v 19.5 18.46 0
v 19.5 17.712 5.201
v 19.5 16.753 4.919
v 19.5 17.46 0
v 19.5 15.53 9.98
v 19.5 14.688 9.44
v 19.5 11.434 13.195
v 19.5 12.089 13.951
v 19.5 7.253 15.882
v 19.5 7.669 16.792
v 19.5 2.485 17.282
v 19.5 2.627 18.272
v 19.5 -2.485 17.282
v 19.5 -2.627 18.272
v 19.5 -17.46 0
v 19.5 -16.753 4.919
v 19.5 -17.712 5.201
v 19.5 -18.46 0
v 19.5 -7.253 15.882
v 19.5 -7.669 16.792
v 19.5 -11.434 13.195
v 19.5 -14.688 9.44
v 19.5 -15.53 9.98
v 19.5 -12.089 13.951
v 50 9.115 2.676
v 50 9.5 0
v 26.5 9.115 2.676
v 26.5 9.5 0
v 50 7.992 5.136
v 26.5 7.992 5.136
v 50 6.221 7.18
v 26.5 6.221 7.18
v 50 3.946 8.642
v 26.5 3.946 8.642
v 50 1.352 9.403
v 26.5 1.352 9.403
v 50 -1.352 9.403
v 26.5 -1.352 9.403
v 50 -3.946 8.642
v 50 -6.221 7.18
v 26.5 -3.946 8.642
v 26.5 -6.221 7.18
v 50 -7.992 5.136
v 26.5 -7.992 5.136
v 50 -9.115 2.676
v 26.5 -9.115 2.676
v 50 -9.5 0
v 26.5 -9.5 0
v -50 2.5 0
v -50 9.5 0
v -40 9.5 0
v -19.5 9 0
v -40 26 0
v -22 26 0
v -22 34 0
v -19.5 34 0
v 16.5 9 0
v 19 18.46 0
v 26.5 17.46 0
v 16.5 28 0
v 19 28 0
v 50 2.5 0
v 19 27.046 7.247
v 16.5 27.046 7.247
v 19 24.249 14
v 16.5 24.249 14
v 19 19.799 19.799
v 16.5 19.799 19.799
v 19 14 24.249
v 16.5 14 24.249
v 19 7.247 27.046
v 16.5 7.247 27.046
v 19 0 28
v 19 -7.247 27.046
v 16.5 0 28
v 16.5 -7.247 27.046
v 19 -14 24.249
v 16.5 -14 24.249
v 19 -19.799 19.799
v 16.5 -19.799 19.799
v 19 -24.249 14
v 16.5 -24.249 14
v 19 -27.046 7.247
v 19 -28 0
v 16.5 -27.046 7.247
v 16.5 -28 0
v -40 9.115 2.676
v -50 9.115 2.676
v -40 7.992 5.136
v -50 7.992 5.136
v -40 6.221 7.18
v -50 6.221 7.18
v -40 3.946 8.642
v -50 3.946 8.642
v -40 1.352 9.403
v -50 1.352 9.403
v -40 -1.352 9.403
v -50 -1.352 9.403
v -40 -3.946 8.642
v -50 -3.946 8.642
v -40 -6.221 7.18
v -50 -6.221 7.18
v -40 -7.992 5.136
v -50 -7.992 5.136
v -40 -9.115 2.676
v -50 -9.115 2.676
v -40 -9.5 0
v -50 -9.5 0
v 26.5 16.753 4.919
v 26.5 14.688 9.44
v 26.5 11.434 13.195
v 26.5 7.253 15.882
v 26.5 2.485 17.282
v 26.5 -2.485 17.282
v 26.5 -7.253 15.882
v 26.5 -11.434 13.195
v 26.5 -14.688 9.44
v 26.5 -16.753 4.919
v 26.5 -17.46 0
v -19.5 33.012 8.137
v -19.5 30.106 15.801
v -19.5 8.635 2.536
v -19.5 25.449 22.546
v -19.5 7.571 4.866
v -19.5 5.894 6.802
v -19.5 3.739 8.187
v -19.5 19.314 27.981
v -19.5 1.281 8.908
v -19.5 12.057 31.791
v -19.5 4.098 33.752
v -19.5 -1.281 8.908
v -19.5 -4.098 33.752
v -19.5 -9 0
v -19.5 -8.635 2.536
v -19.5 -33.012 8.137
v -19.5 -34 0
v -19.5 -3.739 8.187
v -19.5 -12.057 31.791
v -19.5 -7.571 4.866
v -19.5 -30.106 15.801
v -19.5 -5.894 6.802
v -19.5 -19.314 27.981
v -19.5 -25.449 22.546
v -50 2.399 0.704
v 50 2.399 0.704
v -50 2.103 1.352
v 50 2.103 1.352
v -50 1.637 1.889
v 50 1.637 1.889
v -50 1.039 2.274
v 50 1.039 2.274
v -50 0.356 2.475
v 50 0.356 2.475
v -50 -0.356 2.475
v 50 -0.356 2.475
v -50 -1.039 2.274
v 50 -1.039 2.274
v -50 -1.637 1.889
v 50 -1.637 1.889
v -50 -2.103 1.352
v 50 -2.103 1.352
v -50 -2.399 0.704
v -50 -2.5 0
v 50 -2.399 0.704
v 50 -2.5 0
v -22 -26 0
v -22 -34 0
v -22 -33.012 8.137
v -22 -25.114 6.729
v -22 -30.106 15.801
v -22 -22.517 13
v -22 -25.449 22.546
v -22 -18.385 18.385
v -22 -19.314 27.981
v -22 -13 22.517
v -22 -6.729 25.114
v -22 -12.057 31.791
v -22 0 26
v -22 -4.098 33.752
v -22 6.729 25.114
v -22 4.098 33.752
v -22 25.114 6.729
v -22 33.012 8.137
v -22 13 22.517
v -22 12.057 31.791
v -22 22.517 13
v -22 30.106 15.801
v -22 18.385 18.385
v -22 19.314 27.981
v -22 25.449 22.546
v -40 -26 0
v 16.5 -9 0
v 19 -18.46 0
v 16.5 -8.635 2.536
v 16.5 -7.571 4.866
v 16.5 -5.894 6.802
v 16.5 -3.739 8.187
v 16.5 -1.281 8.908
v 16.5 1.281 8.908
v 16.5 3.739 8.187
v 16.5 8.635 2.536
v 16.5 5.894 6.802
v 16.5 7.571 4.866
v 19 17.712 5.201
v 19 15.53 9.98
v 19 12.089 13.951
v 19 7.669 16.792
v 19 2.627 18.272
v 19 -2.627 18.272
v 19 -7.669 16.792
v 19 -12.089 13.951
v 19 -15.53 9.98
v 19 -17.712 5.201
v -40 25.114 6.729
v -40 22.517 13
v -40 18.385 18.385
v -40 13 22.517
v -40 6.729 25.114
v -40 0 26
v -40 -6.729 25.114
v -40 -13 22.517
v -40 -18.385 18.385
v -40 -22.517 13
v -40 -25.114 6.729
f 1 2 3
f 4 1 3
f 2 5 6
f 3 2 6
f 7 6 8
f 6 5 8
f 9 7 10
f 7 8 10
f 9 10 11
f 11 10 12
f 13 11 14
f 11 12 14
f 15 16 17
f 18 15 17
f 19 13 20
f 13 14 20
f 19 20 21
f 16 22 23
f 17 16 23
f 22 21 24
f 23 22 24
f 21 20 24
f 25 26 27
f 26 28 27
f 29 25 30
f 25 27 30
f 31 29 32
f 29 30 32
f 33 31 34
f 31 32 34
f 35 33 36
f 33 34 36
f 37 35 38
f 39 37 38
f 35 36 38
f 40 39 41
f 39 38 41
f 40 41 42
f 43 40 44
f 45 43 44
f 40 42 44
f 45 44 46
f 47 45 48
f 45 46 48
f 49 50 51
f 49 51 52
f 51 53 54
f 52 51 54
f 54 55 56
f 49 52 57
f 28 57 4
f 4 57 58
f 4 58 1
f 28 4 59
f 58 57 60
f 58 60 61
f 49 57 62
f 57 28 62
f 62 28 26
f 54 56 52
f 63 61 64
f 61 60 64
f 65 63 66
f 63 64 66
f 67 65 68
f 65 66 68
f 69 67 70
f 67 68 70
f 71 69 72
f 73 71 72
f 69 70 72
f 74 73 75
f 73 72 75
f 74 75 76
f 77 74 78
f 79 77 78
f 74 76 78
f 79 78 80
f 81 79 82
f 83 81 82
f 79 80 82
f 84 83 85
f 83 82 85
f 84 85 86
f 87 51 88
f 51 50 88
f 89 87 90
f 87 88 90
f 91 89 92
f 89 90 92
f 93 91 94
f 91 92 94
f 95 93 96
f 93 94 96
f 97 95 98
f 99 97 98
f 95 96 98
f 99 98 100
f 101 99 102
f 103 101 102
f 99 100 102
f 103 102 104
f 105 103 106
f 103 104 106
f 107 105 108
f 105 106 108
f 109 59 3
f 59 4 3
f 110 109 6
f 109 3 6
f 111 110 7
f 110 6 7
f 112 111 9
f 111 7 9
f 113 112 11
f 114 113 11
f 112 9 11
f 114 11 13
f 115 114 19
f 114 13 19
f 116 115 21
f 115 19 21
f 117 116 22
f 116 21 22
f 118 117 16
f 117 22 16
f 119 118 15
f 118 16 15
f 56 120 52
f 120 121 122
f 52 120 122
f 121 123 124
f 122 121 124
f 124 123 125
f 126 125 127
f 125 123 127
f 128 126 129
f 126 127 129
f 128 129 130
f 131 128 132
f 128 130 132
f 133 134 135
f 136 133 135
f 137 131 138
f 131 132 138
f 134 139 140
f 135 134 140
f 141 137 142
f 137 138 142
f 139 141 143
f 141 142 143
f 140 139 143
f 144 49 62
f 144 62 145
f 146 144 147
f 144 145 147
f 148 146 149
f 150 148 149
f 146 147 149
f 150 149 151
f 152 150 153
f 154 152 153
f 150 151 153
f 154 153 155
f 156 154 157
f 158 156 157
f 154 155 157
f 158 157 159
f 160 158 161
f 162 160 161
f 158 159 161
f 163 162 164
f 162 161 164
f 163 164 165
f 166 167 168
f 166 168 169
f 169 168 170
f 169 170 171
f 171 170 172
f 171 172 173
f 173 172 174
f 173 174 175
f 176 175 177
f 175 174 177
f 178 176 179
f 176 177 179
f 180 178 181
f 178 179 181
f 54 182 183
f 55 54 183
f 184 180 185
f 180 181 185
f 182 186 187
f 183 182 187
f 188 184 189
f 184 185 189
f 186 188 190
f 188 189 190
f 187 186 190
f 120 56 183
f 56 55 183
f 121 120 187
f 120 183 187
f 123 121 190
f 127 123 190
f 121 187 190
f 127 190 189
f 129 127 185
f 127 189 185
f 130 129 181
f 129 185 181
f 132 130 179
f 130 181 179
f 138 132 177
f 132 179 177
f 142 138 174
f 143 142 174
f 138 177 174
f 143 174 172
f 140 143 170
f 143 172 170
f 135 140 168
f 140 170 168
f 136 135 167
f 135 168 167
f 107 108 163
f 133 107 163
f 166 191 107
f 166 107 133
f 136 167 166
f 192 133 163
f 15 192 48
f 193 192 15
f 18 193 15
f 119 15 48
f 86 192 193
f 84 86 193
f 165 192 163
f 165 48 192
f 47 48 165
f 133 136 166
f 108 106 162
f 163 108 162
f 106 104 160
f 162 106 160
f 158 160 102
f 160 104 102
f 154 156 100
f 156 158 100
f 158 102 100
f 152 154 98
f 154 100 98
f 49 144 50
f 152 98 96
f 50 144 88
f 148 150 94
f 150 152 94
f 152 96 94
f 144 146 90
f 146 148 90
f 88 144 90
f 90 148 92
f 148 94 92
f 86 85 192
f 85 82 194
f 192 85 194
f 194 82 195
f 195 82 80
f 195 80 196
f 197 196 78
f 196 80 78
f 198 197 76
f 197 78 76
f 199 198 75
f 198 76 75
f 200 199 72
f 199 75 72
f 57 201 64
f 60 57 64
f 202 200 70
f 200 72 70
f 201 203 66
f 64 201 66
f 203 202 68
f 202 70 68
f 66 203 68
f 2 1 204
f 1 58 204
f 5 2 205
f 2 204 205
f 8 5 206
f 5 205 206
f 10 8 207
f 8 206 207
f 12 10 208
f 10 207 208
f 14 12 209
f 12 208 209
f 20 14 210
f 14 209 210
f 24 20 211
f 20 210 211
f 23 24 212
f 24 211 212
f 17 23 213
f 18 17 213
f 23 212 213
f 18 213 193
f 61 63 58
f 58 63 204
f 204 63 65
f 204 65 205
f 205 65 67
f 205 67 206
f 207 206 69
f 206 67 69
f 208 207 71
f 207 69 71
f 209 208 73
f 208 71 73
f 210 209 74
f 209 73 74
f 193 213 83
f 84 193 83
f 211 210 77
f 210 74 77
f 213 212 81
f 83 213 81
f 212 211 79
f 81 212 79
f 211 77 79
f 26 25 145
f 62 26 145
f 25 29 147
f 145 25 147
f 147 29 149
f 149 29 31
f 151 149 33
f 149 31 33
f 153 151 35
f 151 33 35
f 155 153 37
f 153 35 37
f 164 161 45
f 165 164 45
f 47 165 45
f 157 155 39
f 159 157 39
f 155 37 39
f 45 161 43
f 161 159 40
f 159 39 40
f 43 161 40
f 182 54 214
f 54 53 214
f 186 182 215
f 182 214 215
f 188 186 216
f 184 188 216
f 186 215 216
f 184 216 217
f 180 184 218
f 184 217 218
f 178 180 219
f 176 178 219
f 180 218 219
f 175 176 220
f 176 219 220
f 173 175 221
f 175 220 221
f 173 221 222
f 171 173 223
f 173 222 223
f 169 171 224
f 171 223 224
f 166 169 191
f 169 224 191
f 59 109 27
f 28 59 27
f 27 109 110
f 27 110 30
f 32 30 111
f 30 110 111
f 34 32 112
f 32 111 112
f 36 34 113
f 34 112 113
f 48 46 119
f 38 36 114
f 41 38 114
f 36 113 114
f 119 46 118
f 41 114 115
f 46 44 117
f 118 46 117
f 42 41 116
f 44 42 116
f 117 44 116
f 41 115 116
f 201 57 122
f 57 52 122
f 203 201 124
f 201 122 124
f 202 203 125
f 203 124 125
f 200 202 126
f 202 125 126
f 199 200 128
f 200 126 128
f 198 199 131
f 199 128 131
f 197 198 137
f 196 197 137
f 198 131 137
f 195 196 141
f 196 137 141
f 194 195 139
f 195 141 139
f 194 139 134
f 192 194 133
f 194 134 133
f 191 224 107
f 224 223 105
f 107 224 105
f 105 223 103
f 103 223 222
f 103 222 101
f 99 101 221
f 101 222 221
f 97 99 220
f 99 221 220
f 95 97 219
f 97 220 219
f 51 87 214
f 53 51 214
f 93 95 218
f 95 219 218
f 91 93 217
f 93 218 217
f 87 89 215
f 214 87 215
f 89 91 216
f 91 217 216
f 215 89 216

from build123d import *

# Parameters (mm, degrees)
REVOLUTION_ANGLE = 180


with BuildPart() as part:
    # Sketch → Revolution (revolve)
    with BuildSketch(Plane.XY):
        Polygon((26.5, 9.5), (26.5, 17.46), (19.5, 17.46), (19.5, 18.46), (19, 18.46), (19, 28), (16.5, 28), (16.5, 9), (-19.5, 9), (-19.5, 34), (-22, 34), (-22, 26), (-40, 26), (-40, 9.5), (-50, 9.5), (-50, 2.5), (50, 2.5), (50, 9.5), align=None)
    revolve(axis=Axis((0, 0, 0), (1, 0, 0)), revolution_arc=REVOLUTION_ANGLE)


solid = part.part
